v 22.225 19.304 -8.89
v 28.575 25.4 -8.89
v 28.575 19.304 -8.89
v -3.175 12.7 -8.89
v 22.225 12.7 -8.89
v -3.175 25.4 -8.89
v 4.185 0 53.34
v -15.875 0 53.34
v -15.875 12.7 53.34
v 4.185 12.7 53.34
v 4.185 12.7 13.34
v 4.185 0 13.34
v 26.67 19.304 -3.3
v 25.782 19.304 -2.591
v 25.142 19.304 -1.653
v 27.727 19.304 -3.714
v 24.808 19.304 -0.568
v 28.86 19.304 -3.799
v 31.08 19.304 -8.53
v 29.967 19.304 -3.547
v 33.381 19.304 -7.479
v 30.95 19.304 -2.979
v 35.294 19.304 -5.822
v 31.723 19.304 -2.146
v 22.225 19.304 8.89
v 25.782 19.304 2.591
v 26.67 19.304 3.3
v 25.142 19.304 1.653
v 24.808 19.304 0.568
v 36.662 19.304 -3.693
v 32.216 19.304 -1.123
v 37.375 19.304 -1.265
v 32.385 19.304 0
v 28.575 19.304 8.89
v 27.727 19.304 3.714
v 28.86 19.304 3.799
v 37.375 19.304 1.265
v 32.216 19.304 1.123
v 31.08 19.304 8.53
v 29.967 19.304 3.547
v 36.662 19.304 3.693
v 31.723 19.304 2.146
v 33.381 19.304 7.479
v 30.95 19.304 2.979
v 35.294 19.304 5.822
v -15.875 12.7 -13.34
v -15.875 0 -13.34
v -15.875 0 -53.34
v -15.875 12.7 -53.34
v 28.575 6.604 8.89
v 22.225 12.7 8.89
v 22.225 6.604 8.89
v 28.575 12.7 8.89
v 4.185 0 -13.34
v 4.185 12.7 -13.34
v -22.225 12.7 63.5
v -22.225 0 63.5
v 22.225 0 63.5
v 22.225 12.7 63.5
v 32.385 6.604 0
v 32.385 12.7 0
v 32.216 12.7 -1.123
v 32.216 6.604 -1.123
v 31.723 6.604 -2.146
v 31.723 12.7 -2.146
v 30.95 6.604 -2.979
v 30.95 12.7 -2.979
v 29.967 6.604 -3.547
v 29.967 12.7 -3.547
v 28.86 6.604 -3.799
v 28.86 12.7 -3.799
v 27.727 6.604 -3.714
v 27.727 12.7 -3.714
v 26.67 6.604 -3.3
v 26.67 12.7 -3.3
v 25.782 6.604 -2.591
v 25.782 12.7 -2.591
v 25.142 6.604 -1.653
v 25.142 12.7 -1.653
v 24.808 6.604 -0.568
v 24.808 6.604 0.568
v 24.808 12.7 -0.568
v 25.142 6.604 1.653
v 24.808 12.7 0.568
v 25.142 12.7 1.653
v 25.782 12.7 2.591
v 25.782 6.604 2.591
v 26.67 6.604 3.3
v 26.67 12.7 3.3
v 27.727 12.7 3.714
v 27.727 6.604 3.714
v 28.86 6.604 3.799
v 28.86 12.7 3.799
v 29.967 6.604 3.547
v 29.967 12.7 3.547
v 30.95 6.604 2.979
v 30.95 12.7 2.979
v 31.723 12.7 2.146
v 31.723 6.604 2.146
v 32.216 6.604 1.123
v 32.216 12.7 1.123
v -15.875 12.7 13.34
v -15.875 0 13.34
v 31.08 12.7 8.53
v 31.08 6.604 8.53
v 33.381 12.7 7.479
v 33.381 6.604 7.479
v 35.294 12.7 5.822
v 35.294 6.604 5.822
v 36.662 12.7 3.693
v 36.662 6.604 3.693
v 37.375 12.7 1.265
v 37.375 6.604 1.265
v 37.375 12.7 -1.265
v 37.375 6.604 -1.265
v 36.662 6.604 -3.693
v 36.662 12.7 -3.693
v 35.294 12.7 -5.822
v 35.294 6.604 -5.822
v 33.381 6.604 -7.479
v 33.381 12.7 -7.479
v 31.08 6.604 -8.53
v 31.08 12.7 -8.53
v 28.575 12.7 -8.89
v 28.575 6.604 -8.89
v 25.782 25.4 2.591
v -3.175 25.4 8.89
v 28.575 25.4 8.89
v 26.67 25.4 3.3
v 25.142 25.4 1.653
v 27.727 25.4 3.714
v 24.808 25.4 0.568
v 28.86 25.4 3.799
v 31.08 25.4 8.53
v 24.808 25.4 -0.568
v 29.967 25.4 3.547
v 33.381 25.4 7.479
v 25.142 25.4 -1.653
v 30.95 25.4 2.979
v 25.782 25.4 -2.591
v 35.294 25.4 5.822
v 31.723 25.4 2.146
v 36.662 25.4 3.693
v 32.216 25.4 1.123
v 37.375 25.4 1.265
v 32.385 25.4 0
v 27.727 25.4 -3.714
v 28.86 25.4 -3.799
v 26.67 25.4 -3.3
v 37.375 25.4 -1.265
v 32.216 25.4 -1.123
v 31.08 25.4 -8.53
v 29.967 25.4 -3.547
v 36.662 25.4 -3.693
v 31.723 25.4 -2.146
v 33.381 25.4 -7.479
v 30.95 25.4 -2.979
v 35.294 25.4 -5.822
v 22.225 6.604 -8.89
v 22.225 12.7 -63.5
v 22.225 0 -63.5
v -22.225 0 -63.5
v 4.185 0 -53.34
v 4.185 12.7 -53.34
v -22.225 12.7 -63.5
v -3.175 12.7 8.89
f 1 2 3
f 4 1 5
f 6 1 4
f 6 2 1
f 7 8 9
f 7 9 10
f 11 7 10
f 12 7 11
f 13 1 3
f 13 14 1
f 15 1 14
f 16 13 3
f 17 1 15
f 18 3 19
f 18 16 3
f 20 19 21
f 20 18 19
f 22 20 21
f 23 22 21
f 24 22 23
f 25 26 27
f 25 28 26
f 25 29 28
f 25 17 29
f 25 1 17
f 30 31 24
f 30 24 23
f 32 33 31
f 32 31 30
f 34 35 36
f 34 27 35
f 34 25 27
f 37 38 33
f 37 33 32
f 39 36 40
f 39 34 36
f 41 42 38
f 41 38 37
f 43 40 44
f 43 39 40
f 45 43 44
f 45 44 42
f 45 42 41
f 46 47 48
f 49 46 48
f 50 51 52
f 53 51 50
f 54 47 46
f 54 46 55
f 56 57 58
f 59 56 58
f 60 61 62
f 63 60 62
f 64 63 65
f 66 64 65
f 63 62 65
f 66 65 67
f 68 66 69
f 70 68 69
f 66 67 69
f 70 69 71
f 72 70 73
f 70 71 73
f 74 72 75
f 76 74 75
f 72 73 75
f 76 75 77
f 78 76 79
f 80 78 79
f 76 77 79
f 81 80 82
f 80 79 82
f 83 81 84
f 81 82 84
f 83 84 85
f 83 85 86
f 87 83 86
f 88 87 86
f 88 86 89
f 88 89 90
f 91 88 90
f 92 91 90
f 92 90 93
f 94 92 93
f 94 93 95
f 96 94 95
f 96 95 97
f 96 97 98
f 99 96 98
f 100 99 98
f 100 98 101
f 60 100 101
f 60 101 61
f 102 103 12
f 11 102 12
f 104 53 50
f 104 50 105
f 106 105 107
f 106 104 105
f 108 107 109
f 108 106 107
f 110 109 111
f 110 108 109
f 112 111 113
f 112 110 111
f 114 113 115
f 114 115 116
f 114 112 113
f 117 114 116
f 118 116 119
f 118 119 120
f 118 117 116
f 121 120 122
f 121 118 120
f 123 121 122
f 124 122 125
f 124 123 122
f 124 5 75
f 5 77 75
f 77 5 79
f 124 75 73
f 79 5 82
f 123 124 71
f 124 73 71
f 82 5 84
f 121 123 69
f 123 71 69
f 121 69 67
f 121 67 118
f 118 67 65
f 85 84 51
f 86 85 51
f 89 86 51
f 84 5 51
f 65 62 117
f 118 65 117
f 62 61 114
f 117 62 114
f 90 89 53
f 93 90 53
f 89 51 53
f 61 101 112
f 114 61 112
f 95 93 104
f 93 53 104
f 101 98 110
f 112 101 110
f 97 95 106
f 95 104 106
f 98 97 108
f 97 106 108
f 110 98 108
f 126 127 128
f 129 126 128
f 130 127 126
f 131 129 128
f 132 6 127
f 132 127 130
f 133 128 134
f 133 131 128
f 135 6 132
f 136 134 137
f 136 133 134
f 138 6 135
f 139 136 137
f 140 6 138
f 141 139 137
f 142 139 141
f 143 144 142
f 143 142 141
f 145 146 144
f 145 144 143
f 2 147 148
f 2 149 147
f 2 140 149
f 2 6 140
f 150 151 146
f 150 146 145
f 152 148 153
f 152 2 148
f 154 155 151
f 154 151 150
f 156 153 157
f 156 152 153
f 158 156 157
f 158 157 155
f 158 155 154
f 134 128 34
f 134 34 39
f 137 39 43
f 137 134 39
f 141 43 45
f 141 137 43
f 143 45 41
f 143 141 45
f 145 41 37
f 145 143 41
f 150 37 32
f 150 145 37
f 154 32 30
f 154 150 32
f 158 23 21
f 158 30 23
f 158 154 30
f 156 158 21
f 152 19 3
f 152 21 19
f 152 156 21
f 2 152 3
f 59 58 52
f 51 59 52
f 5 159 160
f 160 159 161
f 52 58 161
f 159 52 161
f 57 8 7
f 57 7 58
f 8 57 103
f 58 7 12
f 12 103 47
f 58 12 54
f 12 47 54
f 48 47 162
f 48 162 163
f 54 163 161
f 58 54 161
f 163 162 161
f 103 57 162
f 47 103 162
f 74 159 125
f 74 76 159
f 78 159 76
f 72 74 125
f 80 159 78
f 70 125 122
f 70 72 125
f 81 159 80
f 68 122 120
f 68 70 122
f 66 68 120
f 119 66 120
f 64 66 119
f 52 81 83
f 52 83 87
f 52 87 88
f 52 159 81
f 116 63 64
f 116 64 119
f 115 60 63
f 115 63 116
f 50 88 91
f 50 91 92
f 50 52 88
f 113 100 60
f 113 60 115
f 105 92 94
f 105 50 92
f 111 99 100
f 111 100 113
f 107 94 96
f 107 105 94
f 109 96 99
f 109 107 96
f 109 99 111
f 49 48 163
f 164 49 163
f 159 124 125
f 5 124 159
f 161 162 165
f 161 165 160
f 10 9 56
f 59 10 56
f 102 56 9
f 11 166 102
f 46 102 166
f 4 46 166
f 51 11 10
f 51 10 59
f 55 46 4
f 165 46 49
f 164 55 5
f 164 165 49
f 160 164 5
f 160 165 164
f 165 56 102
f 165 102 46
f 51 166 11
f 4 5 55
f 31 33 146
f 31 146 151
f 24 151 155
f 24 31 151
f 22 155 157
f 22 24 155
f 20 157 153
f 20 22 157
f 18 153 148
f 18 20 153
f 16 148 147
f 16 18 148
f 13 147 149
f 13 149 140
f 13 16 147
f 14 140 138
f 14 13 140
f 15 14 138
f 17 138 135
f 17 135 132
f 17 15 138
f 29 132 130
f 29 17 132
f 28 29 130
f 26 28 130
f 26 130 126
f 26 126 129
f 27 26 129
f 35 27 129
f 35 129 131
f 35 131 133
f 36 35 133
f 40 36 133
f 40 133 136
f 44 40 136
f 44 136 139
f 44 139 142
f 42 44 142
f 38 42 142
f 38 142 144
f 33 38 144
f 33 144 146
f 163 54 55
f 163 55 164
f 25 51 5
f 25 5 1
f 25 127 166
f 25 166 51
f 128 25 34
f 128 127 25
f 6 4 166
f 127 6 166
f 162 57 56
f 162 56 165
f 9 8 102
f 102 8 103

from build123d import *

# Parameters (mm, degrees)
SKETCH1_W                = 44.45
SKETCH1_H                = 127
SKETCH1_W_2              = 20.060000012
SKETCH1_H_2              = 40.00000001
BOSS_EXTRUDE1_DEPTH      = 12.7
BOSS_EXTRUDE2_DEPTH      = 12.7
BOSS_EXTRUDE2_DEPTH_BACK = 12.7
SKETCH2_R                = 3.81
SKETCH3_W                = 15.24
SKETCH3_H                = 6.604
CUT_EXTRUDE1_DEPTH       = 23.114


with BuildPart() as part:
    # Sketch1 → Boss-Extrude1 (new body)
    with BuildSketch(Plane(origin=(0, 0, 0), x_dir=(1, 0, 0), z_dir=(0, 1, 0))):
        Rectangle(SKETCH1_W, SKETCH1_H)
        with Locations((-5.844999994, 33.339999995)):
            Rectangle(SKETCH1_W_2, SKETCH1_H_2, mode=Mode.SUBTRACT)
        with Locations((-5.844999994, -33.339999995)):
            Rectangle(SKETCH1_W_2, SKETCH1_H_2, mode=Mode.SUBTRACT)
    extrude(amount=BOSS_EXTRUDE1_DEPTH)

    # Sketch2 → Boss-Extrude2 (add, two sides: drawn at the far end of the back side and taken through both)
    with BuildSketch(Plane(origin=(0, 12.7, 0), x_dir=(1, 0, 0), z_dir=(0, 1, 0)).offset(-BOSS_EXTRUDE2_DEPTH_BACK)):
        with BuildLine():
            Line((28.575, 8.89), (-3.175, 8.89))
            Line((-3.175, 8.89), (-3.175, -8.89))
            Line((-3.175, -8.89), (28.575, -8.89))
            ThreePointArc((28.575, -8.89), (37.465, 0), (28.575, 8.89))
        make_face()
        with Locations((28.575, 0)):
            Circle(SKETCH2_R, mode=Mode.SUBTRACT)
    extrude(amount=BOSS_EXTRUDE2_DEPTH + BOSS_EXTRUDE2_DEPTH_BACK)

    # Sketch3 → Cut-Extrude1 (cut)
    with BuildSketch(Plane.XY.offset(8.89)):
        with Locations((29.845, 16.002)):
            Rectangle(SKETCH3_W, SKETCH3_H)
        with Locations((29.845, 3.302)):
            Rectangle(SKETCH3_W, SKETCH3_H)
    extrude(amount=-CUT_EXTRUDE1_DEPTH, mode=Mode.SUBTRACT)


solid = part.part
